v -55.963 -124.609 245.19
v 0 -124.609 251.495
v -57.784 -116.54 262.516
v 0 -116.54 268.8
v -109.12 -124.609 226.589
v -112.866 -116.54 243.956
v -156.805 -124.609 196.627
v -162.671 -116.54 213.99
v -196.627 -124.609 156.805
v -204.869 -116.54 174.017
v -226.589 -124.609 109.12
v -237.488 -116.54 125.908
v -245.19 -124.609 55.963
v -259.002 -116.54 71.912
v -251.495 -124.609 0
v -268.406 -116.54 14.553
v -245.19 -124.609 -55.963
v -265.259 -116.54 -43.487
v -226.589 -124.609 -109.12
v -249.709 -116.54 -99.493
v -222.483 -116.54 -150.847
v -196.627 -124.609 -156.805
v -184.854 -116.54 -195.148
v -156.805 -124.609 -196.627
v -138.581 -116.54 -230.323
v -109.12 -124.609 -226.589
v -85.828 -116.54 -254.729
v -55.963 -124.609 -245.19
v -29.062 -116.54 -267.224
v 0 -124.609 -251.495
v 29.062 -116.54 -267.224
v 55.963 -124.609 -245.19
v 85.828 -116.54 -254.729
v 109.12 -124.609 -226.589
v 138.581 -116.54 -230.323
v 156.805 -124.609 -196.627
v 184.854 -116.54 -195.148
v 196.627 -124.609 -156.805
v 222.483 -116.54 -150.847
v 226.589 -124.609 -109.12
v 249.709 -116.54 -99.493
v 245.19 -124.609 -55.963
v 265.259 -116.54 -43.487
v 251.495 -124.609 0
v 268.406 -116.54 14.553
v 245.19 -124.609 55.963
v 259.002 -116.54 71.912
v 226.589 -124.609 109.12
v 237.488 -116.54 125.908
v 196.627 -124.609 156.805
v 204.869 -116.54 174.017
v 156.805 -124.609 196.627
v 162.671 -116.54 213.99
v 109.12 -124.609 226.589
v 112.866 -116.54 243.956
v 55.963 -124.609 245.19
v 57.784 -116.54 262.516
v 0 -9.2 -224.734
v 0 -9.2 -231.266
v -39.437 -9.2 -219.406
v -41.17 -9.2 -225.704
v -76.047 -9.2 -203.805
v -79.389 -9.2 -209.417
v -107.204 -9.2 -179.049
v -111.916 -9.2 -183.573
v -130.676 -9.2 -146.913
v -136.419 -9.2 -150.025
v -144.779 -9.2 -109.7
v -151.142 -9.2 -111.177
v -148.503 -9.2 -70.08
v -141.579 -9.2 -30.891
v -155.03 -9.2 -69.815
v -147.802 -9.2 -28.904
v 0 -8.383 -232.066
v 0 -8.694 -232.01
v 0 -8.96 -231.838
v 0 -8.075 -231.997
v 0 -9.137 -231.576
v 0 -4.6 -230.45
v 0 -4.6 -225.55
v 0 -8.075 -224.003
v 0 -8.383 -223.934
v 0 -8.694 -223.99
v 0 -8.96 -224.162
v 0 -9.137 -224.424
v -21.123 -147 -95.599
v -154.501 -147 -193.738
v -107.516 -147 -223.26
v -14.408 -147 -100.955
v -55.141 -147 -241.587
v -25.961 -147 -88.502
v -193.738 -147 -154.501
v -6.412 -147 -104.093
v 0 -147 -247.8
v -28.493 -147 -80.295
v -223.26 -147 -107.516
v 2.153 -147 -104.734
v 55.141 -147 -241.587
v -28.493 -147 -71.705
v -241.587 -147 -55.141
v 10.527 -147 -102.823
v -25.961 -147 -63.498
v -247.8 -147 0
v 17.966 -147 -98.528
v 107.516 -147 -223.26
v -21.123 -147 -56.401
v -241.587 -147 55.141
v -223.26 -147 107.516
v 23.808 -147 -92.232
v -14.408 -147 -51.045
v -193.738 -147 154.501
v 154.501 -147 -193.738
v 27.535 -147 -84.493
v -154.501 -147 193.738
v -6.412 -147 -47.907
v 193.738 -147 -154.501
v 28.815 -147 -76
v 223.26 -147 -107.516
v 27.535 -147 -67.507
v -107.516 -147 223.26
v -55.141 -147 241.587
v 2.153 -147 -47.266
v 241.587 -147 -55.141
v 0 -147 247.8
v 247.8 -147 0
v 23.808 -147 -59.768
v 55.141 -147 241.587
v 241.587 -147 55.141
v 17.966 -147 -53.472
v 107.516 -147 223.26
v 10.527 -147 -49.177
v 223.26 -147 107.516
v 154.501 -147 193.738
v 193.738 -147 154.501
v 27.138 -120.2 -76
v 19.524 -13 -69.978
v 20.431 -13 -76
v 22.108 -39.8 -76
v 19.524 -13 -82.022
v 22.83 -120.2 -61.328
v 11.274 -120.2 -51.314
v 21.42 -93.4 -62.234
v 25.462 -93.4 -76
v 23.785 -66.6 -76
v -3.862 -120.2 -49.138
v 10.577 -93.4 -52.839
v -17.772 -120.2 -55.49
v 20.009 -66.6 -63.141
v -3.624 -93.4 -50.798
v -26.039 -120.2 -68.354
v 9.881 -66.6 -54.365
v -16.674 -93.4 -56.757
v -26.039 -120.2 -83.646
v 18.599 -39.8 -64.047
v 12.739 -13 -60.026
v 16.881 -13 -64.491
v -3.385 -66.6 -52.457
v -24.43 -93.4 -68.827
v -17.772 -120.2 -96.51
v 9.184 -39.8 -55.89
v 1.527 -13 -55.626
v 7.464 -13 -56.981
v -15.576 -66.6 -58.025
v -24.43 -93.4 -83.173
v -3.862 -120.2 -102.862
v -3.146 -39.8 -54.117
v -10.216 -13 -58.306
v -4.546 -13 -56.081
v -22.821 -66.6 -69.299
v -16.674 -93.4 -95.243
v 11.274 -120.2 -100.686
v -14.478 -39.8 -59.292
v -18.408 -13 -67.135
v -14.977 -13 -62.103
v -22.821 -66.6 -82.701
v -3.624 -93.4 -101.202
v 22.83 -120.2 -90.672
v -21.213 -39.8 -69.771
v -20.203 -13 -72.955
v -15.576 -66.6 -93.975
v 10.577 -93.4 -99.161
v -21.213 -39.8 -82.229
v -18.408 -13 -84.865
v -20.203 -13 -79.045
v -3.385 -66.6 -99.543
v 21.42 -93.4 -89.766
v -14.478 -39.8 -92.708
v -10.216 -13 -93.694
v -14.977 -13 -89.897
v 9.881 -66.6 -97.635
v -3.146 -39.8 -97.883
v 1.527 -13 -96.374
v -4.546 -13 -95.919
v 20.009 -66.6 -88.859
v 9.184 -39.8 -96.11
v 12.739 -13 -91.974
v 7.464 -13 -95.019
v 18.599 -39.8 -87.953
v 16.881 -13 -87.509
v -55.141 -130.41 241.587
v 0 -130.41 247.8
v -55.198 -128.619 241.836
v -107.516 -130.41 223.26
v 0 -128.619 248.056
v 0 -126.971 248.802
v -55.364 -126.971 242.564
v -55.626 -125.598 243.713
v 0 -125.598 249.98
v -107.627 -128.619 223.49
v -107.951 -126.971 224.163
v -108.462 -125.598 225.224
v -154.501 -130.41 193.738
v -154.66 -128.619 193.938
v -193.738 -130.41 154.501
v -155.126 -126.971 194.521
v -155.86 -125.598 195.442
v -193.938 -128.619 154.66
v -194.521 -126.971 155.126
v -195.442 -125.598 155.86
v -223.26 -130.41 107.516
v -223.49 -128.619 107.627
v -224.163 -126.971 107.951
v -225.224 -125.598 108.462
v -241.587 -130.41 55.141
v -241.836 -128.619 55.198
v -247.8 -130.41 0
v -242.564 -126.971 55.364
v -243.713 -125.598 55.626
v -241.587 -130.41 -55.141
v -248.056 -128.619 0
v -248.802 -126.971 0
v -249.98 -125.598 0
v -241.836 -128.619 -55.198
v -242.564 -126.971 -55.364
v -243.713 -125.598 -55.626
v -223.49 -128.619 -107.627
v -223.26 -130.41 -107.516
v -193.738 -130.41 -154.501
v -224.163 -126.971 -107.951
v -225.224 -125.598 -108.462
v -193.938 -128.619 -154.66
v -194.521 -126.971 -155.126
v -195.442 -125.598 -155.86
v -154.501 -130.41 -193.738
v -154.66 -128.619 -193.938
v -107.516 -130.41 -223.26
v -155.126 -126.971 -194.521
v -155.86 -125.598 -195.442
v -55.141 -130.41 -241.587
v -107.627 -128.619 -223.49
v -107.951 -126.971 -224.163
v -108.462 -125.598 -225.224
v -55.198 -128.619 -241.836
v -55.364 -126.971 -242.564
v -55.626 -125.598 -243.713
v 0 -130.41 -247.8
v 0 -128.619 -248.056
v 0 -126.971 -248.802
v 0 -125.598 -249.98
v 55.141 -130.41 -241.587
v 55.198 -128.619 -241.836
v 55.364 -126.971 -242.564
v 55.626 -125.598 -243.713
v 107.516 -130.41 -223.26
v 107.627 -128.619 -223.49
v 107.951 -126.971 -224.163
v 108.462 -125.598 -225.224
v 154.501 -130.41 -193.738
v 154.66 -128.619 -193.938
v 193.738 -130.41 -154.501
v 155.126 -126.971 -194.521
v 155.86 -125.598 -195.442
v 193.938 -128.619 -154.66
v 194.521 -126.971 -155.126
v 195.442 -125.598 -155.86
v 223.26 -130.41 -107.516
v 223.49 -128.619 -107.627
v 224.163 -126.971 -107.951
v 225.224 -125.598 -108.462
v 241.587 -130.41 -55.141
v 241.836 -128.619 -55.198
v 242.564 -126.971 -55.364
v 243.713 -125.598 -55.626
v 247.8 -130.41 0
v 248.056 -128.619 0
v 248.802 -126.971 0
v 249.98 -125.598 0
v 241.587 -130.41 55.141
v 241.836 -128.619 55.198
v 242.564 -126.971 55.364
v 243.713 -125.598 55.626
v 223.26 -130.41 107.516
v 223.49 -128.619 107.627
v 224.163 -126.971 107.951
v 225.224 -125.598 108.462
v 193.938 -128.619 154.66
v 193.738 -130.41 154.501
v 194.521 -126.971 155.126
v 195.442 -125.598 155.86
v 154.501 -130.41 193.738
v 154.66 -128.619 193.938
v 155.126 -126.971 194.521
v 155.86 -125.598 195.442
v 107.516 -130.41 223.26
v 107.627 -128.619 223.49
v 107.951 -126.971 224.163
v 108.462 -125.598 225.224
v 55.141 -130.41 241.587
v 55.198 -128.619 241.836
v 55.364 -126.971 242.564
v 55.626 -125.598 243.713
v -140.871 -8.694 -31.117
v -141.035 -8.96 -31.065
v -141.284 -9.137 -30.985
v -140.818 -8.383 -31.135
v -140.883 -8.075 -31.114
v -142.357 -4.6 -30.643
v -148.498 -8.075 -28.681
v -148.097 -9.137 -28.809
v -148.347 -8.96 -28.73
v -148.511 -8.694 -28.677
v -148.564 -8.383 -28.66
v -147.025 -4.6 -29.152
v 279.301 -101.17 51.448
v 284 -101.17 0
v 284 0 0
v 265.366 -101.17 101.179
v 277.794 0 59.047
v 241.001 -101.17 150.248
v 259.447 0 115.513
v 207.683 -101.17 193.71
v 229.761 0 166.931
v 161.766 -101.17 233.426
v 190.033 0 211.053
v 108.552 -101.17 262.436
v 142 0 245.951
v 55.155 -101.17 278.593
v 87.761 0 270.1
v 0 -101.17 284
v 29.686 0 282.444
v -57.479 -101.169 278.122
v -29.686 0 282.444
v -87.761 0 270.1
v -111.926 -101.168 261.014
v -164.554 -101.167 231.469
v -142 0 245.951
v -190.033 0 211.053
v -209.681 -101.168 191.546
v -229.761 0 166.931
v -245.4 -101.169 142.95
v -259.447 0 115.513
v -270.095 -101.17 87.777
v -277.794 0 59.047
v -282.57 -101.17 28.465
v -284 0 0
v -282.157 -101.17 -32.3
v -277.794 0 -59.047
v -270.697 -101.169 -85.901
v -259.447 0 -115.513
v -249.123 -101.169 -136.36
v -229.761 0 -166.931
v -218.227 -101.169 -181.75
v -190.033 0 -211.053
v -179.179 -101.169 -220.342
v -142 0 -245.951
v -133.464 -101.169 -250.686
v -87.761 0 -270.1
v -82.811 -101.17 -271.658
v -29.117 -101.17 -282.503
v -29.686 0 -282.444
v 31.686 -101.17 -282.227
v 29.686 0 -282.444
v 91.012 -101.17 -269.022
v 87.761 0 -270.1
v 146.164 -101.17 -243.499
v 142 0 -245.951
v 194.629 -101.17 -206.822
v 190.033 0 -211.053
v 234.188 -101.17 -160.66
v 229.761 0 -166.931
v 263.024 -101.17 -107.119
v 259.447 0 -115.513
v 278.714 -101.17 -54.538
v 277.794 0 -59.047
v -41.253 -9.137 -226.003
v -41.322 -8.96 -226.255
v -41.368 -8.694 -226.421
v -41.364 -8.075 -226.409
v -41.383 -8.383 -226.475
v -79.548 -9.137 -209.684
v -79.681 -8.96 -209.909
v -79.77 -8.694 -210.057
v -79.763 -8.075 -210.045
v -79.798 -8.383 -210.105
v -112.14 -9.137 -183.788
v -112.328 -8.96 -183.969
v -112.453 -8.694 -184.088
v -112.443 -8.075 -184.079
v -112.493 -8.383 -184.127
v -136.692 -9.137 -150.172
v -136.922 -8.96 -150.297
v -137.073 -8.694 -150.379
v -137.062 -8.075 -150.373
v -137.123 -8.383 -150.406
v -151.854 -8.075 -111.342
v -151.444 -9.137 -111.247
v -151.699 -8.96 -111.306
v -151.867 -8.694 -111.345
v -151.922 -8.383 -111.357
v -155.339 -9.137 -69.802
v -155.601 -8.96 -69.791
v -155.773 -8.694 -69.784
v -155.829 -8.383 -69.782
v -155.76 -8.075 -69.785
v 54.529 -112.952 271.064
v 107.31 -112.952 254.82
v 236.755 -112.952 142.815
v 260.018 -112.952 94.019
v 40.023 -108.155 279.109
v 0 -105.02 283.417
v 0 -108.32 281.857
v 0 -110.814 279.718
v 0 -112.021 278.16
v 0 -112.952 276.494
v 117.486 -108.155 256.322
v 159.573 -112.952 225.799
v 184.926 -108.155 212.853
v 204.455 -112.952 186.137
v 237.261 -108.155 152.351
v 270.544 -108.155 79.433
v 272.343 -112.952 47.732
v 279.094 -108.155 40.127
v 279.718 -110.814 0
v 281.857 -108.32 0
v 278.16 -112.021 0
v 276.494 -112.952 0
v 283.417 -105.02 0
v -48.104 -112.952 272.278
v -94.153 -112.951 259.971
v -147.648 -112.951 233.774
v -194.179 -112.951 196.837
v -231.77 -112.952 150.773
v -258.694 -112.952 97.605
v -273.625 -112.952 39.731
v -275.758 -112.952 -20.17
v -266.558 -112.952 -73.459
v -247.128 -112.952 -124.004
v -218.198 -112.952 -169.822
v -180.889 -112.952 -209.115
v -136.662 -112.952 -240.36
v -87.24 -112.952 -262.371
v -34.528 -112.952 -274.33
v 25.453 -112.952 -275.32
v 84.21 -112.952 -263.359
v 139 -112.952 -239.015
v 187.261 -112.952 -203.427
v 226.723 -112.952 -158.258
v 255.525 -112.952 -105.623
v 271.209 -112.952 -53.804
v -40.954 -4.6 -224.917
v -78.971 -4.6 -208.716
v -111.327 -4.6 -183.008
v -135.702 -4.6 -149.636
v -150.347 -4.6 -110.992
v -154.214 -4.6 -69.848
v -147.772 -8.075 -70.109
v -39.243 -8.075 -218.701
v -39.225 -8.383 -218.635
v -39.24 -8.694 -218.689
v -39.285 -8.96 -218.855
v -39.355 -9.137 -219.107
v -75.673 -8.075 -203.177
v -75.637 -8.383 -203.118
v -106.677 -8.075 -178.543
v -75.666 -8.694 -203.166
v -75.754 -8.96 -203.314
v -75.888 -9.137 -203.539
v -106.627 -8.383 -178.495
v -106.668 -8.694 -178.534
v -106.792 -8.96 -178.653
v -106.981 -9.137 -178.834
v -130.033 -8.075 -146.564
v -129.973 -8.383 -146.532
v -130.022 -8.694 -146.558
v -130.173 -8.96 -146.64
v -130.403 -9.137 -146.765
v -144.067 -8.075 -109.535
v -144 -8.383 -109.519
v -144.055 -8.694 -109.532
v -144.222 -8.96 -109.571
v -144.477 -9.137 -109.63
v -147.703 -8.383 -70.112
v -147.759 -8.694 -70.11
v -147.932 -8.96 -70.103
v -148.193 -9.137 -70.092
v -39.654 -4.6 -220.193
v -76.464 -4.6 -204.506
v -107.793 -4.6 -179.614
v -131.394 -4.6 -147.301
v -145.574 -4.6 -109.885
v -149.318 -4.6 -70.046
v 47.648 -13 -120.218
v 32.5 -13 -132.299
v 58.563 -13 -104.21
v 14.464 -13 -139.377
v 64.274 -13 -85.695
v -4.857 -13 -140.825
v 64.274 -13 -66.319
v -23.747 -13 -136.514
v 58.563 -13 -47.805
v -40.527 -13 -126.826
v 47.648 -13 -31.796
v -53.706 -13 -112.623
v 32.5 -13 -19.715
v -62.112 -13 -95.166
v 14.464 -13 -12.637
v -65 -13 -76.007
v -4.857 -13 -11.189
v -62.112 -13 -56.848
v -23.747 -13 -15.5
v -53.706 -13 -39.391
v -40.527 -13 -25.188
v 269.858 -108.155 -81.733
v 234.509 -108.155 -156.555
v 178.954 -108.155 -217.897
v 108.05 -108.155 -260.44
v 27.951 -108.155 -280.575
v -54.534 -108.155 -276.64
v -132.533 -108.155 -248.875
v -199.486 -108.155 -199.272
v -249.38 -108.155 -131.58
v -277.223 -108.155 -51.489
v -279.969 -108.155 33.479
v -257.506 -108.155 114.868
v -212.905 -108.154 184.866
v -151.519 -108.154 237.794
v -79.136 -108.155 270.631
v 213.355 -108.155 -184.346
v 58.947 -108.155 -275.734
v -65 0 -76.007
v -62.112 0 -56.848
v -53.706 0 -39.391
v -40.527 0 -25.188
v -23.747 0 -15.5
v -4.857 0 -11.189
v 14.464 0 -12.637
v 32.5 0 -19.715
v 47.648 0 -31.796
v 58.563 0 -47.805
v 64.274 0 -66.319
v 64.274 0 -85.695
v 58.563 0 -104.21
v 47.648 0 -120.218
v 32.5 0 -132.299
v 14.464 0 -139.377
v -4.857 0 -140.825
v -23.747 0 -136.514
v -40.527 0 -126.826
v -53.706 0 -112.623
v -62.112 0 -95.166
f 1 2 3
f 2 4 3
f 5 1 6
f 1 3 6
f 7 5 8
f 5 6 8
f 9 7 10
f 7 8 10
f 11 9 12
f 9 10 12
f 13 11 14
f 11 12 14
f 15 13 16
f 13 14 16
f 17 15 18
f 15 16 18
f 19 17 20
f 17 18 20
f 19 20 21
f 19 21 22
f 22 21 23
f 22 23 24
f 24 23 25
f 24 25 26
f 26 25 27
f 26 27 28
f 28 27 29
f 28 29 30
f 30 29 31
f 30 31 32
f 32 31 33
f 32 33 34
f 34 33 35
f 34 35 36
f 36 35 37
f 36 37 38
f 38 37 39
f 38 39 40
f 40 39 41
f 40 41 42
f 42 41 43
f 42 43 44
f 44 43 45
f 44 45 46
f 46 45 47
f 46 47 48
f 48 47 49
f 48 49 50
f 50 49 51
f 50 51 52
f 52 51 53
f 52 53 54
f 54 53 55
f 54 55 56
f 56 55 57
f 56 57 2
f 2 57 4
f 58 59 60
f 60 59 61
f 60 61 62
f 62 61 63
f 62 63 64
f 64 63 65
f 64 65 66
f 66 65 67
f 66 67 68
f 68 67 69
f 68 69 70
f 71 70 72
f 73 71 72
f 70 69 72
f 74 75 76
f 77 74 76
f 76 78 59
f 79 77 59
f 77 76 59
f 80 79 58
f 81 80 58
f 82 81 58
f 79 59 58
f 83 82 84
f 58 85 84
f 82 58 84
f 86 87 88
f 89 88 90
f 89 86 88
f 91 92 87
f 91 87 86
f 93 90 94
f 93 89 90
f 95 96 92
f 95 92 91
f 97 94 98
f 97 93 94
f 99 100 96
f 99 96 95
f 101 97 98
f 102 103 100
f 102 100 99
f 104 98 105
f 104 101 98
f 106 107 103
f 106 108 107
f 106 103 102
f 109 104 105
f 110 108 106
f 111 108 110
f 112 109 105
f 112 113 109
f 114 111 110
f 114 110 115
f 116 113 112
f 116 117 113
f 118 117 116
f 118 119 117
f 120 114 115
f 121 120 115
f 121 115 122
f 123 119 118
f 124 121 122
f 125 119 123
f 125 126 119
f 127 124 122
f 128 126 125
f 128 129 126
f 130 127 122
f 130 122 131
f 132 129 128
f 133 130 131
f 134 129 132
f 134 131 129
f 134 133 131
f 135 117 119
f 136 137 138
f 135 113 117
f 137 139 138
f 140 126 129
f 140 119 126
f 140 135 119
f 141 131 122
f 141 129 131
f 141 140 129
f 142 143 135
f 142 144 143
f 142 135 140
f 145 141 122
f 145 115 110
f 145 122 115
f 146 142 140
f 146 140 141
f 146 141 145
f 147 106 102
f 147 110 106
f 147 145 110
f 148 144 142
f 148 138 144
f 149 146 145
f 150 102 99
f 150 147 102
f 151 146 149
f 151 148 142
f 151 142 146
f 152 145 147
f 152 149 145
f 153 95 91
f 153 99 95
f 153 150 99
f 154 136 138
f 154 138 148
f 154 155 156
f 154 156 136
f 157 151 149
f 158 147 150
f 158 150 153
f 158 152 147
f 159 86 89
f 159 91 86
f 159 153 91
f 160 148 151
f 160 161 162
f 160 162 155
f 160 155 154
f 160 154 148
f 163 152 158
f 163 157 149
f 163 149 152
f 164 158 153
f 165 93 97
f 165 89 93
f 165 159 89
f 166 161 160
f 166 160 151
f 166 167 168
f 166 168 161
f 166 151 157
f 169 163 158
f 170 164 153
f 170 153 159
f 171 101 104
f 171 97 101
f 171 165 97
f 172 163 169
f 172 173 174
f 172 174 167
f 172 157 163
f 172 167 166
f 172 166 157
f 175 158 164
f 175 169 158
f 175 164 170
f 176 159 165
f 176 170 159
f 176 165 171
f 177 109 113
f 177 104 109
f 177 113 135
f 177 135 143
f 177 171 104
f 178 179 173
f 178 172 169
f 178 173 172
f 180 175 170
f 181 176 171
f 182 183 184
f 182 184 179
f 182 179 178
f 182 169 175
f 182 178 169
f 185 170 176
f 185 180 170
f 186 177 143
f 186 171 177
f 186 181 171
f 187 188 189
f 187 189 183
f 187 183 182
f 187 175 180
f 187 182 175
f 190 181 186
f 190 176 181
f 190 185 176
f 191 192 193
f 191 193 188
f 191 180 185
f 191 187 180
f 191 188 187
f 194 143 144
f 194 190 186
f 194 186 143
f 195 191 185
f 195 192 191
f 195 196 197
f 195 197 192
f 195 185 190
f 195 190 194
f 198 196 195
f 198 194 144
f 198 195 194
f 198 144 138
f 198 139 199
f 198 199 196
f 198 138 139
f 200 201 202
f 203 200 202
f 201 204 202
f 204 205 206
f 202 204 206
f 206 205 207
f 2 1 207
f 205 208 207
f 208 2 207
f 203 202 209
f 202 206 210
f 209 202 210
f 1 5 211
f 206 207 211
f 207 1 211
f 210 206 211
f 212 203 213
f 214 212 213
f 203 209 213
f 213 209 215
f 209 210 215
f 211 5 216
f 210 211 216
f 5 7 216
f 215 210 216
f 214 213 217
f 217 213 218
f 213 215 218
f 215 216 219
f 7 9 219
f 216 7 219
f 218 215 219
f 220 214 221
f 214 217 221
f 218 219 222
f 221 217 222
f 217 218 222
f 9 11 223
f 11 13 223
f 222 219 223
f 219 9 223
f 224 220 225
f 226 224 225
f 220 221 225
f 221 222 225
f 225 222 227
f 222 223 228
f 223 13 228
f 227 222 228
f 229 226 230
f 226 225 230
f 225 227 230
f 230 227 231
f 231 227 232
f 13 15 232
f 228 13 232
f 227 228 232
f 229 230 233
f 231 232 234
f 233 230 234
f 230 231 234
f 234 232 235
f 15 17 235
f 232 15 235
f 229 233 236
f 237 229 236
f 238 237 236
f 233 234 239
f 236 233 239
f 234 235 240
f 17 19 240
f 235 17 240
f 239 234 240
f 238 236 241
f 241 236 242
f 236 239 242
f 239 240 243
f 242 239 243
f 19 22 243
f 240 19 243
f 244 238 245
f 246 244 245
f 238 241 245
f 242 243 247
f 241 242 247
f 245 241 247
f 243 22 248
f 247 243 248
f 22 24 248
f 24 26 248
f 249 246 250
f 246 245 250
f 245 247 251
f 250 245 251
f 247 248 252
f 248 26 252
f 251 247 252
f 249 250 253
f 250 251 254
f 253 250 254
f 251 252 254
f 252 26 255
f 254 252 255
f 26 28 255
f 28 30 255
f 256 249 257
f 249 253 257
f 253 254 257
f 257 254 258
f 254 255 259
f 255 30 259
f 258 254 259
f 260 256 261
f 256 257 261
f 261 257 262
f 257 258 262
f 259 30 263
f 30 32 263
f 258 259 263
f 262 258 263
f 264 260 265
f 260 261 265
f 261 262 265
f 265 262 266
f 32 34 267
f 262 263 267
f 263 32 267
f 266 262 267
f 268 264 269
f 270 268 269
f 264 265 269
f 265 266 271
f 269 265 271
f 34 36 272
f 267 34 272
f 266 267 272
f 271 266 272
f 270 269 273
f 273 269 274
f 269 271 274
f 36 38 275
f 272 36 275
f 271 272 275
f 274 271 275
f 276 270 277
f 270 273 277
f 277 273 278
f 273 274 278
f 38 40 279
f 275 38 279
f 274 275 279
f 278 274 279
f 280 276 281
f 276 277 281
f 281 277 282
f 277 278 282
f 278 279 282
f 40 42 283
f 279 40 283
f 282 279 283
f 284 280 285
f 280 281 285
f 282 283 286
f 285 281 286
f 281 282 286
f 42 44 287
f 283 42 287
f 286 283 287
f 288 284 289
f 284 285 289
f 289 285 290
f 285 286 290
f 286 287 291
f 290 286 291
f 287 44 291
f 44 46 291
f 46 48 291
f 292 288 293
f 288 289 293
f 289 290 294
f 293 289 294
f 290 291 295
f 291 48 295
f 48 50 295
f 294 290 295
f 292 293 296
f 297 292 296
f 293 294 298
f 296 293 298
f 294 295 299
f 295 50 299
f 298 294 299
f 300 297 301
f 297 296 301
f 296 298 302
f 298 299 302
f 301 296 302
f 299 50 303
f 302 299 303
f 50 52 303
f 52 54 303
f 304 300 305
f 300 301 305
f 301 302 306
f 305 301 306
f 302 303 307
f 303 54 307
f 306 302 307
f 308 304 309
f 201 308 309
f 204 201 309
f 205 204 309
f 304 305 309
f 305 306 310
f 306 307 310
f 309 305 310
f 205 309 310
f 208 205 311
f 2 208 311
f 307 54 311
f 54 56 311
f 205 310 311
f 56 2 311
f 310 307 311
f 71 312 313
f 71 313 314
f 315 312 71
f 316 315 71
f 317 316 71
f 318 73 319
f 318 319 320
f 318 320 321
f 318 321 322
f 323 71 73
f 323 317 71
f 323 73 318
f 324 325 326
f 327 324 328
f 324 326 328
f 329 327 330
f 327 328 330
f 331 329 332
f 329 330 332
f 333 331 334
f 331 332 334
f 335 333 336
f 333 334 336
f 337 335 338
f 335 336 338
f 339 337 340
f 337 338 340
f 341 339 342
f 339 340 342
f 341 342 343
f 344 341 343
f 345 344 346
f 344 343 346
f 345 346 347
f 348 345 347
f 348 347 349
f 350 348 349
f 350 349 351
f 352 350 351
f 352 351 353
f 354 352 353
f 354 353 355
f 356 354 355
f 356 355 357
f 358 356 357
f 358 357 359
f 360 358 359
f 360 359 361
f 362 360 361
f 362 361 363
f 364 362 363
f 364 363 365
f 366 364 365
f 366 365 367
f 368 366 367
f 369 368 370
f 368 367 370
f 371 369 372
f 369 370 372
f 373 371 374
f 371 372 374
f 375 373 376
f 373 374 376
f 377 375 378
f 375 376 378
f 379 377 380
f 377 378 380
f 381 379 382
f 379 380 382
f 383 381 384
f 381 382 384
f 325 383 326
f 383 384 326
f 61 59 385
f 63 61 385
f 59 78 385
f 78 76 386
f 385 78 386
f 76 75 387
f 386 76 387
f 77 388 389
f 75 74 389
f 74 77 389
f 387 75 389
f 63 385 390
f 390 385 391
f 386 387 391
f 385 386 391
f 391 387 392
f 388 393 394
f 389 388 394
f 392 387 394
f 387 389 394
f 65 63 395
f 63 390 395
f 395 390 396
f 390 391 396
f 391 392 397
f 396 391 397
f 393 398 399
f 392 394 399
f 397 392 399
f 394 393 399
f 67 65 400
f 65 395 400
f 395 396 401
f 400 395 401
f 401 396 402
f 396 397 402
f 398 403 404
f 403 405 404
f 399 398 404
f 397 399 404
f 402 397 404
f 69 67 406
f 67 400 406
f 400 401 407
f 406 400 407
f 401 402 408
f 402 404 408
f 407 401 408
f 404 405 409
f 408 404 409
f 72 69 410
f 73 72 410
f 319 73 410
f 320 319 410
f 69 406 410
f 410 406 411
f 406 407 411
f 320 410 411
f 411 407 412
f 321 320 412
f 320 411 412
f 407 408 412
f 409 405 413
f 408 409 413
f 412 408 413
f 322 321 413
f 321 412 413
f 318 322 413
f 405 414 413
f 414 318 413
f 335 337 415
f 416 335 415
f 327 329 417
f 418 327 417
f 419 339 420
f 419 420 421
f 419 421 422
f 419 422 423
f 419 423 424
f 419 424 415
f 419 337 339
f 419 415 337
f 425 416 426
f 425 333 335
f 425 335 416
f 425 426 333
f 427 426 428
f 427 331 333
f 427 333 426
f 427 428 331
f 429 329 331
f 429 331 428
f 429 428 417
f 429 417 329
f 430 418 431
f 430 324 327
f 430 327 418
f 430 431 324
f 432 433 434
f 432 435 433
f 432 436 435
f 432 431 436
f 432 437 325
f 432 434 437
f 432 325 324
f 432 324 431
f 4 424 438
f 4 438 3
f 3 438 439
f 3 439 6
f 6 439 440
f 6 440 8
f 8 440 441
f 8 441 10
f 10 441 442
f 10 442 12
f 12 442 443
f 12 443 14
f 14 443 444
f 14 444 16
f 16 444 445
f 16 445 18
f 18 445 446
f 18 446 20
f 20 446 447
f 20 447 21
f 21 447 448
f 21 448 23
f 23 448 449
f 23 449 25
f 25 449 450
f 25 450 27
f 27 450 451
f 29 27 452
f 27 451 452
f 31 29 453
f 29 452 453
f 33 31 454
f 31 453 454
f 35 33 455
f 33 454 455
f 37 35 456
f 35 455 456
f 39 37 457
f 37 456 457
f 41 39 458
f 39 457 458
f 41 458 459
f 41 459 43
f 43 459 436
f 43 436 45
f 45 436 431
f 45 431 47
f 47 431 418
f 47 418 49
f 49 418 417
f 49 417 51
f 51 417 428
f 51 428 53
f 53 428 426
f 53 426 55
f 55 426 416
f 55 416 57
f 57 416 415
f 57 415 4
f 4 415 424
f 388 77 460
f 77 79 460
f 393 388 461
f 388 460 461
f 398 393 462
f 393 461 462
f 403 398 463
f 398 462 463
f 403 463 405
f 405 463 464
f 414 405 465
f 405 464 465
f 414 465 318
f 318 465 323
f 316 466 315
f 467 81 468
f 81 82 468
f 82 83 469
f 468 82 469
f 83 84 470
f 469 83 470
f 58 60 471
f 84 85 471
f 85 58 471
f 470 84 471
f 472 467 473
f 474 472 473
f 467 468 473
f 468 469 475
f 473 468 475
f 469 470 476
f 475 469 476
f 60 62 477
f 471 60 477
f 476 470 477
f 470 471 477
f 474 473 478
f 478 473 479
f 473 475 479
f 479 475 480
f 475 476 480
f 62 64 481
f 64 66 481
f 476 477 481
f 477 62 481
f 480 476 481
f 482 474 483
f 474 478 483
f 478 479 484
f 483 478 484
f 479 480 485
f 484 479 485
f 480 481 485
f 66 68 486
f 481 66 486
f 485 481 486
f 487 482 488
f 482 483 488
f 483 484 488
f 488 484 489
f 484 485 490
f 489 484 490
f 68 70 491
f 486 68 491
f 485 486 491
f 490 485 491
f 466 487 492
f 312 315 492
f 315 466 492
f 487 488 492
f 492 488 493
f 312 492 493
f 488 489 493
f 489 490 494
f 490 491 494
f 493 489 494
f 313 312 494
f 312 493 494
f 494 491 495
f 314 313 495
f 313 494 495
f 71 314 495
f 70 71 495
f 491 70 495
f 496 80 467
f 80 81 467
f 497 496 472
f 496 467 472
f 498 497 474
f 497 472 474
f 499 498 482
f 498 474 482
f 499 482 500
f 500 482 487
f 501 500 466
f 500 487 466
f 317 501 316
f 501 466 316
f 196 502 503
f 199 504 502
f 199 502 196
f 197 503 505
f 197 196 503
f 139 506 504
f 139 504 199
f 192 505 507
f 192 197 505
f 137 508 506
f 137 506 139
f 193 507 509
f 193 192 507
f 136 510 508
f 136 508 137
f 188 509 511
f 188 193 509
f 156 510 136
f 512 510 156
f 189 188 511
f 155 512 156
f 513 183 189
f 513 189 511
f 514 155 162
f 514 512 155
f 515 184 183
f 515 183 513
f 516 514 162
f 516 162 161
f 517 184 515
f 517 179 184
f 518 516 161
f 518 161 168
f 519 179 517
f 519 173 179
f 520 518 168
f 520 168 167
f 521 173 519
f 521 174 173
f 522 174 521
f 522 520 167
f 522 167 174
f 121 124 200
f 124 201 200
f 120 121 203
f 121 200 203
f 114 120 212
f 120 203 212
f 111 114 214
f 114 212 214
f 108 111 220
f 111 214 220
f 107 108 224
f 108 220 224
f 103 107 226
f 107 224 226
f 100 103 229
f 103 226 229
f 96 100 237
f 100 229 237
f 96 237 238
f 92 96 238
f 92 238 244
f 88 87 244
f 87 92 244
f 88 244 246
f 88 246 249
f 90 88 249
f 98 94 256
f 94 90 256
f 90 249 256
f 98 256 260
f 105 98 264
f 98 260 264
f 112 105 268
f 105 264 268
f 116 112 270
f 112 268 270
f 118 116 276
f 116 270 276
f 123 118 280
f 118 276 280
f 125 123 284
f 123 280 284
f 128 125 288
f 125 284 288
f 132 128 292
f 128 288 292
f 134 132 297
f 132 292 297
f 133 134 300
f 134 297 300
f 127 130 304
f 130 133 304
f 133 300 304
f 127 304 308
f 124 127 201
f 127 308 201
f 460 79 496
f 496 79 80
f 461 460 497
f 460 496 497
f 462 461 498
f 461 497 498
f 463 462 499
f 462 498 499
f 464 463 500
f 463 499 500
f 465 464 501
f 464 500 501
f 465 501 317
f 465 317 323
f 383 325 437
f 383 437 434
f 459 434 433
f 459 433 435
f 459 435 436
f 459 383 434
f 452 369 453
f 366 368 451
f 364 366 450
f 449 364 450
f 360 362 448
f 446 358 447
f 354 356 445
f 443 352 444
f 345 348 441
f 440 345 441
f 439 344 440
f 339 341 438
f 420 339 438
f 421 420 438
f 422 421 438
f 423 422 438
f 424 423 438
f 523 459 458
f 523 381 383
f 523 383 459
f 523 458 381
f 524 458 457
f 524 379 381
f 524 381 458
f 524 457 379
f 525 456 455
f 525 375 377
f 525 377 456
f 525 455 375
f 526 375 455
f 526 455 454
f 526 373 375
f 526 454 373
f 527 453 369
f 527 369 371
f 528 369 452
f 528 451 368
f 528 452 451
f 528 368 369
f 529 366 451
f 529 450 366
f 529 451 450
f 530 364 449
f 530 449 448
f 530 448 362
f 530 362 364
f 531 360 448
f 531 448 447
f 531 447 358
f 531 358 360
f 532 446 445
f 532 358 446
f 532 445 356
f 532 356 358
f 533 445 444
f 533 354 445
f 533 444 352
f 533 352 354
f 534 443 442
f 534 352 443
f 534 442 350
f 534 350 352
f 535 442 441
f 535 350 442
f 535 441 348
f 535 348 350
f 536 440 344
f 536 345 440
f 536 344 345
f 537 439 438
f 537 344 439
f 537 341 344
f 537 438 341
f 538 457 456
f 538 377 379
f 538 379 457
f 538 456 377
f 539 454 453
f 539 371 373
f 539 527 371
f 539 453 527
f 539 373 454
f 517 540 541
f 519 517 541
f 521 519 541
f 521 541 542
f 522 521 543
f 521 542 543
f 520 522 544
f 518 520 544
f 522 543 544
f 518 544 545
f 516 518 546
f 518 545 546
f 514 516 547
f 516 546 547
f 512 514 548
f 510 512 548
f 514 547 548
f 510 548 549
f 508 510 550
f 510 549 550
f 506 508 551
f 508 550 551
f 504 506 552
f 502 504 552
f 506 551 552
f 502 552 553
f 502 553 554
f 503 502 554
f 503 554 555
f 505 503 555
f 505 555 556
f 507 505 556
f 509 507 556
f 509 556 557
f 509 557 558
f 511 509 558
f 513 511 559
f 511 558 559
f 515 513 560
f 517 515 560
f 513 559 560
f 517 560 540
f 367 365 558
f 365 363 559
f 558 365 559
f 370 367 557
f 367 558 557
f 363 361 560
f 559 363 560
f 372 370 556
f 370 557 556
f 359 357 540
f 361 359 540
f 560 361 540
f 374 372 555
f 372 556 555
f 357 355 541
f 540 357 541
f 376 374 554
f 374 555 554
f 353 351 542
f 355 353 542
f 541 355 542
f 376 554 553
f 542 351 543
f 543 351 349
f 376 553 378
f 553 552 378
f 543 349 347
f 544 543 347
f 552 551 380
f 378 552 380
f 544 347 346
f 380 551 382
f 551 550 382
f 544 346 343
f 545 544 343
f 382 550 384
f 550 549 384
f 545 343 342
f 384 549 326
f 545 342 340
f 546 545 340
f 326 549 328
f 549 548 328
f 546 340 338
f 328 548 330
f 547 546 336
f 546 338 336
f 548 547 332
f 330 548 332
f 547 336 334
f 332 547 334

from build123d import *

# Parameters (mm, degrees)
F0_R     = 284
F1_DEPTH = 147
F3_D     = 40
F4_R     = 28.815
F5_DEPTH = 200
F5_TAPER = 3.58
F7_R     = 65
F8_DEPTH = 13
F11_R    = 13


with BuildPart() as f1:
    # F0 (on Front) → F1 (new body)
    with BuildSketch(Plane.XZ):
        Circle(F0_R)
    extrude(amount=F1_DEPTH)

    # F3 (through all)
    with Locations(Plane.XZ.offset(147)):
        with Locations((0, -76)):
            Hole(F3_D / 2)

    # F4 (on face) → F5 (cut)
    with BuildSketch(Plane.XZ.offset(147)):
        with Locations((0, -76)):
            Circle(F4_R)
    extrude(amount=-F5_DEPTH, taper=F5_TAPER, mode=Mode.SUBTRACT)

    # F7 (on face) → F8 (cut)
    with BuildSketch(Plane(origin=(0, 0, 0), x_dir=(-1, 0, 0), z_dir=(0, 1, 0))):
        with Locations((0, -76.0070607066)):
            Circle(F7_R)
    extrude(amount=-F8_DEPTH, mode=Mode.SUBTRACT)

    # F9 (on Right) → F10 (revolve, cut)
    with BuildSketch(Plane.YZ):
        with BuildLine():
            Line((-116.54, 268.8), (-102.9912134112, 297.8554666042))
            Line((-102.9912134112, 297.8554666042), (-166.7411327362, 297.8554666042))
            Line((-166.7411327362, 297.8554666042), (-150.4560261965, 257.221698761))
            Line((-150.4560261965, 257.221698761), (-162.0599727805, 247.8))
            Line((-162.0599727805, 247.8), (-130.4097104904, 247.8))
            ThreePointArc((-130.4097104904, 247.8), (-126.970992997, 248.8022947468), (-124.6093406534, 251.4952431249))
            Line((-124.6093406534, 251.4952431249), (-116.54, 268.8))
        make_face()
    revolve(axis=Axis((0, -103.910677135, 0), (0, -1, 0)), mode=Mode.SUBTRACT)

    # F11
    f11_edges = [f1.edges().sort_by_distance(p)[0] for p in [
        (-200.818326, -109.452124, -200.818326),
        (200.818326, -109.452124, 200.818326),
    ]]
    fillet(f11_edges, radius=F11_R)

    # F14: sweep along a path in F12
    with BuildLine(Plane(origin=(0, 0, 0), x_dir=(-1, 0, 0), z_dir=(0, 1, 0))) as f14_path:
        ThreePointArc((0, -228.1088728905), (122.7460108736, -165.7605143402), (144.7944915292, -29.8643572934))
    # F13 (on Right) → F14 (sweep, cut)
    with BuildSketch(Plane.YZ):
        with BuildLine():
            Line((-4.6, -230.45), (-4.6, -225.55))
            Line((-4.6, -225.55), (-8.0746106855, -224.0030036525))
            ThreePointArc((-8.0746106855, -224.0030036525), (-8.835711228, -224.0629035643), (-9.2, -224.7338400186))
            Line((-9.2, -224.7338400186), (-9.2, -227.7760519524))
            Line((-9.2, -227.7760519524), (-9.2, -228.2239480476))
            Line((-9.2, -228.2239480476), (-9.2, -231.2661599814))
            ThreePointArc((-9.2, -231.2661599814), (-8.835711228, -231.9370964357), (-8.0746106855, -231.9969963475))
            Line((-8.0746106855, -231.9969963475), (-4.6, -230.45))
        make_face()
    sweep(path=f14_path.line, mode=Mode.SUBTRACT)


solid = f1.part
